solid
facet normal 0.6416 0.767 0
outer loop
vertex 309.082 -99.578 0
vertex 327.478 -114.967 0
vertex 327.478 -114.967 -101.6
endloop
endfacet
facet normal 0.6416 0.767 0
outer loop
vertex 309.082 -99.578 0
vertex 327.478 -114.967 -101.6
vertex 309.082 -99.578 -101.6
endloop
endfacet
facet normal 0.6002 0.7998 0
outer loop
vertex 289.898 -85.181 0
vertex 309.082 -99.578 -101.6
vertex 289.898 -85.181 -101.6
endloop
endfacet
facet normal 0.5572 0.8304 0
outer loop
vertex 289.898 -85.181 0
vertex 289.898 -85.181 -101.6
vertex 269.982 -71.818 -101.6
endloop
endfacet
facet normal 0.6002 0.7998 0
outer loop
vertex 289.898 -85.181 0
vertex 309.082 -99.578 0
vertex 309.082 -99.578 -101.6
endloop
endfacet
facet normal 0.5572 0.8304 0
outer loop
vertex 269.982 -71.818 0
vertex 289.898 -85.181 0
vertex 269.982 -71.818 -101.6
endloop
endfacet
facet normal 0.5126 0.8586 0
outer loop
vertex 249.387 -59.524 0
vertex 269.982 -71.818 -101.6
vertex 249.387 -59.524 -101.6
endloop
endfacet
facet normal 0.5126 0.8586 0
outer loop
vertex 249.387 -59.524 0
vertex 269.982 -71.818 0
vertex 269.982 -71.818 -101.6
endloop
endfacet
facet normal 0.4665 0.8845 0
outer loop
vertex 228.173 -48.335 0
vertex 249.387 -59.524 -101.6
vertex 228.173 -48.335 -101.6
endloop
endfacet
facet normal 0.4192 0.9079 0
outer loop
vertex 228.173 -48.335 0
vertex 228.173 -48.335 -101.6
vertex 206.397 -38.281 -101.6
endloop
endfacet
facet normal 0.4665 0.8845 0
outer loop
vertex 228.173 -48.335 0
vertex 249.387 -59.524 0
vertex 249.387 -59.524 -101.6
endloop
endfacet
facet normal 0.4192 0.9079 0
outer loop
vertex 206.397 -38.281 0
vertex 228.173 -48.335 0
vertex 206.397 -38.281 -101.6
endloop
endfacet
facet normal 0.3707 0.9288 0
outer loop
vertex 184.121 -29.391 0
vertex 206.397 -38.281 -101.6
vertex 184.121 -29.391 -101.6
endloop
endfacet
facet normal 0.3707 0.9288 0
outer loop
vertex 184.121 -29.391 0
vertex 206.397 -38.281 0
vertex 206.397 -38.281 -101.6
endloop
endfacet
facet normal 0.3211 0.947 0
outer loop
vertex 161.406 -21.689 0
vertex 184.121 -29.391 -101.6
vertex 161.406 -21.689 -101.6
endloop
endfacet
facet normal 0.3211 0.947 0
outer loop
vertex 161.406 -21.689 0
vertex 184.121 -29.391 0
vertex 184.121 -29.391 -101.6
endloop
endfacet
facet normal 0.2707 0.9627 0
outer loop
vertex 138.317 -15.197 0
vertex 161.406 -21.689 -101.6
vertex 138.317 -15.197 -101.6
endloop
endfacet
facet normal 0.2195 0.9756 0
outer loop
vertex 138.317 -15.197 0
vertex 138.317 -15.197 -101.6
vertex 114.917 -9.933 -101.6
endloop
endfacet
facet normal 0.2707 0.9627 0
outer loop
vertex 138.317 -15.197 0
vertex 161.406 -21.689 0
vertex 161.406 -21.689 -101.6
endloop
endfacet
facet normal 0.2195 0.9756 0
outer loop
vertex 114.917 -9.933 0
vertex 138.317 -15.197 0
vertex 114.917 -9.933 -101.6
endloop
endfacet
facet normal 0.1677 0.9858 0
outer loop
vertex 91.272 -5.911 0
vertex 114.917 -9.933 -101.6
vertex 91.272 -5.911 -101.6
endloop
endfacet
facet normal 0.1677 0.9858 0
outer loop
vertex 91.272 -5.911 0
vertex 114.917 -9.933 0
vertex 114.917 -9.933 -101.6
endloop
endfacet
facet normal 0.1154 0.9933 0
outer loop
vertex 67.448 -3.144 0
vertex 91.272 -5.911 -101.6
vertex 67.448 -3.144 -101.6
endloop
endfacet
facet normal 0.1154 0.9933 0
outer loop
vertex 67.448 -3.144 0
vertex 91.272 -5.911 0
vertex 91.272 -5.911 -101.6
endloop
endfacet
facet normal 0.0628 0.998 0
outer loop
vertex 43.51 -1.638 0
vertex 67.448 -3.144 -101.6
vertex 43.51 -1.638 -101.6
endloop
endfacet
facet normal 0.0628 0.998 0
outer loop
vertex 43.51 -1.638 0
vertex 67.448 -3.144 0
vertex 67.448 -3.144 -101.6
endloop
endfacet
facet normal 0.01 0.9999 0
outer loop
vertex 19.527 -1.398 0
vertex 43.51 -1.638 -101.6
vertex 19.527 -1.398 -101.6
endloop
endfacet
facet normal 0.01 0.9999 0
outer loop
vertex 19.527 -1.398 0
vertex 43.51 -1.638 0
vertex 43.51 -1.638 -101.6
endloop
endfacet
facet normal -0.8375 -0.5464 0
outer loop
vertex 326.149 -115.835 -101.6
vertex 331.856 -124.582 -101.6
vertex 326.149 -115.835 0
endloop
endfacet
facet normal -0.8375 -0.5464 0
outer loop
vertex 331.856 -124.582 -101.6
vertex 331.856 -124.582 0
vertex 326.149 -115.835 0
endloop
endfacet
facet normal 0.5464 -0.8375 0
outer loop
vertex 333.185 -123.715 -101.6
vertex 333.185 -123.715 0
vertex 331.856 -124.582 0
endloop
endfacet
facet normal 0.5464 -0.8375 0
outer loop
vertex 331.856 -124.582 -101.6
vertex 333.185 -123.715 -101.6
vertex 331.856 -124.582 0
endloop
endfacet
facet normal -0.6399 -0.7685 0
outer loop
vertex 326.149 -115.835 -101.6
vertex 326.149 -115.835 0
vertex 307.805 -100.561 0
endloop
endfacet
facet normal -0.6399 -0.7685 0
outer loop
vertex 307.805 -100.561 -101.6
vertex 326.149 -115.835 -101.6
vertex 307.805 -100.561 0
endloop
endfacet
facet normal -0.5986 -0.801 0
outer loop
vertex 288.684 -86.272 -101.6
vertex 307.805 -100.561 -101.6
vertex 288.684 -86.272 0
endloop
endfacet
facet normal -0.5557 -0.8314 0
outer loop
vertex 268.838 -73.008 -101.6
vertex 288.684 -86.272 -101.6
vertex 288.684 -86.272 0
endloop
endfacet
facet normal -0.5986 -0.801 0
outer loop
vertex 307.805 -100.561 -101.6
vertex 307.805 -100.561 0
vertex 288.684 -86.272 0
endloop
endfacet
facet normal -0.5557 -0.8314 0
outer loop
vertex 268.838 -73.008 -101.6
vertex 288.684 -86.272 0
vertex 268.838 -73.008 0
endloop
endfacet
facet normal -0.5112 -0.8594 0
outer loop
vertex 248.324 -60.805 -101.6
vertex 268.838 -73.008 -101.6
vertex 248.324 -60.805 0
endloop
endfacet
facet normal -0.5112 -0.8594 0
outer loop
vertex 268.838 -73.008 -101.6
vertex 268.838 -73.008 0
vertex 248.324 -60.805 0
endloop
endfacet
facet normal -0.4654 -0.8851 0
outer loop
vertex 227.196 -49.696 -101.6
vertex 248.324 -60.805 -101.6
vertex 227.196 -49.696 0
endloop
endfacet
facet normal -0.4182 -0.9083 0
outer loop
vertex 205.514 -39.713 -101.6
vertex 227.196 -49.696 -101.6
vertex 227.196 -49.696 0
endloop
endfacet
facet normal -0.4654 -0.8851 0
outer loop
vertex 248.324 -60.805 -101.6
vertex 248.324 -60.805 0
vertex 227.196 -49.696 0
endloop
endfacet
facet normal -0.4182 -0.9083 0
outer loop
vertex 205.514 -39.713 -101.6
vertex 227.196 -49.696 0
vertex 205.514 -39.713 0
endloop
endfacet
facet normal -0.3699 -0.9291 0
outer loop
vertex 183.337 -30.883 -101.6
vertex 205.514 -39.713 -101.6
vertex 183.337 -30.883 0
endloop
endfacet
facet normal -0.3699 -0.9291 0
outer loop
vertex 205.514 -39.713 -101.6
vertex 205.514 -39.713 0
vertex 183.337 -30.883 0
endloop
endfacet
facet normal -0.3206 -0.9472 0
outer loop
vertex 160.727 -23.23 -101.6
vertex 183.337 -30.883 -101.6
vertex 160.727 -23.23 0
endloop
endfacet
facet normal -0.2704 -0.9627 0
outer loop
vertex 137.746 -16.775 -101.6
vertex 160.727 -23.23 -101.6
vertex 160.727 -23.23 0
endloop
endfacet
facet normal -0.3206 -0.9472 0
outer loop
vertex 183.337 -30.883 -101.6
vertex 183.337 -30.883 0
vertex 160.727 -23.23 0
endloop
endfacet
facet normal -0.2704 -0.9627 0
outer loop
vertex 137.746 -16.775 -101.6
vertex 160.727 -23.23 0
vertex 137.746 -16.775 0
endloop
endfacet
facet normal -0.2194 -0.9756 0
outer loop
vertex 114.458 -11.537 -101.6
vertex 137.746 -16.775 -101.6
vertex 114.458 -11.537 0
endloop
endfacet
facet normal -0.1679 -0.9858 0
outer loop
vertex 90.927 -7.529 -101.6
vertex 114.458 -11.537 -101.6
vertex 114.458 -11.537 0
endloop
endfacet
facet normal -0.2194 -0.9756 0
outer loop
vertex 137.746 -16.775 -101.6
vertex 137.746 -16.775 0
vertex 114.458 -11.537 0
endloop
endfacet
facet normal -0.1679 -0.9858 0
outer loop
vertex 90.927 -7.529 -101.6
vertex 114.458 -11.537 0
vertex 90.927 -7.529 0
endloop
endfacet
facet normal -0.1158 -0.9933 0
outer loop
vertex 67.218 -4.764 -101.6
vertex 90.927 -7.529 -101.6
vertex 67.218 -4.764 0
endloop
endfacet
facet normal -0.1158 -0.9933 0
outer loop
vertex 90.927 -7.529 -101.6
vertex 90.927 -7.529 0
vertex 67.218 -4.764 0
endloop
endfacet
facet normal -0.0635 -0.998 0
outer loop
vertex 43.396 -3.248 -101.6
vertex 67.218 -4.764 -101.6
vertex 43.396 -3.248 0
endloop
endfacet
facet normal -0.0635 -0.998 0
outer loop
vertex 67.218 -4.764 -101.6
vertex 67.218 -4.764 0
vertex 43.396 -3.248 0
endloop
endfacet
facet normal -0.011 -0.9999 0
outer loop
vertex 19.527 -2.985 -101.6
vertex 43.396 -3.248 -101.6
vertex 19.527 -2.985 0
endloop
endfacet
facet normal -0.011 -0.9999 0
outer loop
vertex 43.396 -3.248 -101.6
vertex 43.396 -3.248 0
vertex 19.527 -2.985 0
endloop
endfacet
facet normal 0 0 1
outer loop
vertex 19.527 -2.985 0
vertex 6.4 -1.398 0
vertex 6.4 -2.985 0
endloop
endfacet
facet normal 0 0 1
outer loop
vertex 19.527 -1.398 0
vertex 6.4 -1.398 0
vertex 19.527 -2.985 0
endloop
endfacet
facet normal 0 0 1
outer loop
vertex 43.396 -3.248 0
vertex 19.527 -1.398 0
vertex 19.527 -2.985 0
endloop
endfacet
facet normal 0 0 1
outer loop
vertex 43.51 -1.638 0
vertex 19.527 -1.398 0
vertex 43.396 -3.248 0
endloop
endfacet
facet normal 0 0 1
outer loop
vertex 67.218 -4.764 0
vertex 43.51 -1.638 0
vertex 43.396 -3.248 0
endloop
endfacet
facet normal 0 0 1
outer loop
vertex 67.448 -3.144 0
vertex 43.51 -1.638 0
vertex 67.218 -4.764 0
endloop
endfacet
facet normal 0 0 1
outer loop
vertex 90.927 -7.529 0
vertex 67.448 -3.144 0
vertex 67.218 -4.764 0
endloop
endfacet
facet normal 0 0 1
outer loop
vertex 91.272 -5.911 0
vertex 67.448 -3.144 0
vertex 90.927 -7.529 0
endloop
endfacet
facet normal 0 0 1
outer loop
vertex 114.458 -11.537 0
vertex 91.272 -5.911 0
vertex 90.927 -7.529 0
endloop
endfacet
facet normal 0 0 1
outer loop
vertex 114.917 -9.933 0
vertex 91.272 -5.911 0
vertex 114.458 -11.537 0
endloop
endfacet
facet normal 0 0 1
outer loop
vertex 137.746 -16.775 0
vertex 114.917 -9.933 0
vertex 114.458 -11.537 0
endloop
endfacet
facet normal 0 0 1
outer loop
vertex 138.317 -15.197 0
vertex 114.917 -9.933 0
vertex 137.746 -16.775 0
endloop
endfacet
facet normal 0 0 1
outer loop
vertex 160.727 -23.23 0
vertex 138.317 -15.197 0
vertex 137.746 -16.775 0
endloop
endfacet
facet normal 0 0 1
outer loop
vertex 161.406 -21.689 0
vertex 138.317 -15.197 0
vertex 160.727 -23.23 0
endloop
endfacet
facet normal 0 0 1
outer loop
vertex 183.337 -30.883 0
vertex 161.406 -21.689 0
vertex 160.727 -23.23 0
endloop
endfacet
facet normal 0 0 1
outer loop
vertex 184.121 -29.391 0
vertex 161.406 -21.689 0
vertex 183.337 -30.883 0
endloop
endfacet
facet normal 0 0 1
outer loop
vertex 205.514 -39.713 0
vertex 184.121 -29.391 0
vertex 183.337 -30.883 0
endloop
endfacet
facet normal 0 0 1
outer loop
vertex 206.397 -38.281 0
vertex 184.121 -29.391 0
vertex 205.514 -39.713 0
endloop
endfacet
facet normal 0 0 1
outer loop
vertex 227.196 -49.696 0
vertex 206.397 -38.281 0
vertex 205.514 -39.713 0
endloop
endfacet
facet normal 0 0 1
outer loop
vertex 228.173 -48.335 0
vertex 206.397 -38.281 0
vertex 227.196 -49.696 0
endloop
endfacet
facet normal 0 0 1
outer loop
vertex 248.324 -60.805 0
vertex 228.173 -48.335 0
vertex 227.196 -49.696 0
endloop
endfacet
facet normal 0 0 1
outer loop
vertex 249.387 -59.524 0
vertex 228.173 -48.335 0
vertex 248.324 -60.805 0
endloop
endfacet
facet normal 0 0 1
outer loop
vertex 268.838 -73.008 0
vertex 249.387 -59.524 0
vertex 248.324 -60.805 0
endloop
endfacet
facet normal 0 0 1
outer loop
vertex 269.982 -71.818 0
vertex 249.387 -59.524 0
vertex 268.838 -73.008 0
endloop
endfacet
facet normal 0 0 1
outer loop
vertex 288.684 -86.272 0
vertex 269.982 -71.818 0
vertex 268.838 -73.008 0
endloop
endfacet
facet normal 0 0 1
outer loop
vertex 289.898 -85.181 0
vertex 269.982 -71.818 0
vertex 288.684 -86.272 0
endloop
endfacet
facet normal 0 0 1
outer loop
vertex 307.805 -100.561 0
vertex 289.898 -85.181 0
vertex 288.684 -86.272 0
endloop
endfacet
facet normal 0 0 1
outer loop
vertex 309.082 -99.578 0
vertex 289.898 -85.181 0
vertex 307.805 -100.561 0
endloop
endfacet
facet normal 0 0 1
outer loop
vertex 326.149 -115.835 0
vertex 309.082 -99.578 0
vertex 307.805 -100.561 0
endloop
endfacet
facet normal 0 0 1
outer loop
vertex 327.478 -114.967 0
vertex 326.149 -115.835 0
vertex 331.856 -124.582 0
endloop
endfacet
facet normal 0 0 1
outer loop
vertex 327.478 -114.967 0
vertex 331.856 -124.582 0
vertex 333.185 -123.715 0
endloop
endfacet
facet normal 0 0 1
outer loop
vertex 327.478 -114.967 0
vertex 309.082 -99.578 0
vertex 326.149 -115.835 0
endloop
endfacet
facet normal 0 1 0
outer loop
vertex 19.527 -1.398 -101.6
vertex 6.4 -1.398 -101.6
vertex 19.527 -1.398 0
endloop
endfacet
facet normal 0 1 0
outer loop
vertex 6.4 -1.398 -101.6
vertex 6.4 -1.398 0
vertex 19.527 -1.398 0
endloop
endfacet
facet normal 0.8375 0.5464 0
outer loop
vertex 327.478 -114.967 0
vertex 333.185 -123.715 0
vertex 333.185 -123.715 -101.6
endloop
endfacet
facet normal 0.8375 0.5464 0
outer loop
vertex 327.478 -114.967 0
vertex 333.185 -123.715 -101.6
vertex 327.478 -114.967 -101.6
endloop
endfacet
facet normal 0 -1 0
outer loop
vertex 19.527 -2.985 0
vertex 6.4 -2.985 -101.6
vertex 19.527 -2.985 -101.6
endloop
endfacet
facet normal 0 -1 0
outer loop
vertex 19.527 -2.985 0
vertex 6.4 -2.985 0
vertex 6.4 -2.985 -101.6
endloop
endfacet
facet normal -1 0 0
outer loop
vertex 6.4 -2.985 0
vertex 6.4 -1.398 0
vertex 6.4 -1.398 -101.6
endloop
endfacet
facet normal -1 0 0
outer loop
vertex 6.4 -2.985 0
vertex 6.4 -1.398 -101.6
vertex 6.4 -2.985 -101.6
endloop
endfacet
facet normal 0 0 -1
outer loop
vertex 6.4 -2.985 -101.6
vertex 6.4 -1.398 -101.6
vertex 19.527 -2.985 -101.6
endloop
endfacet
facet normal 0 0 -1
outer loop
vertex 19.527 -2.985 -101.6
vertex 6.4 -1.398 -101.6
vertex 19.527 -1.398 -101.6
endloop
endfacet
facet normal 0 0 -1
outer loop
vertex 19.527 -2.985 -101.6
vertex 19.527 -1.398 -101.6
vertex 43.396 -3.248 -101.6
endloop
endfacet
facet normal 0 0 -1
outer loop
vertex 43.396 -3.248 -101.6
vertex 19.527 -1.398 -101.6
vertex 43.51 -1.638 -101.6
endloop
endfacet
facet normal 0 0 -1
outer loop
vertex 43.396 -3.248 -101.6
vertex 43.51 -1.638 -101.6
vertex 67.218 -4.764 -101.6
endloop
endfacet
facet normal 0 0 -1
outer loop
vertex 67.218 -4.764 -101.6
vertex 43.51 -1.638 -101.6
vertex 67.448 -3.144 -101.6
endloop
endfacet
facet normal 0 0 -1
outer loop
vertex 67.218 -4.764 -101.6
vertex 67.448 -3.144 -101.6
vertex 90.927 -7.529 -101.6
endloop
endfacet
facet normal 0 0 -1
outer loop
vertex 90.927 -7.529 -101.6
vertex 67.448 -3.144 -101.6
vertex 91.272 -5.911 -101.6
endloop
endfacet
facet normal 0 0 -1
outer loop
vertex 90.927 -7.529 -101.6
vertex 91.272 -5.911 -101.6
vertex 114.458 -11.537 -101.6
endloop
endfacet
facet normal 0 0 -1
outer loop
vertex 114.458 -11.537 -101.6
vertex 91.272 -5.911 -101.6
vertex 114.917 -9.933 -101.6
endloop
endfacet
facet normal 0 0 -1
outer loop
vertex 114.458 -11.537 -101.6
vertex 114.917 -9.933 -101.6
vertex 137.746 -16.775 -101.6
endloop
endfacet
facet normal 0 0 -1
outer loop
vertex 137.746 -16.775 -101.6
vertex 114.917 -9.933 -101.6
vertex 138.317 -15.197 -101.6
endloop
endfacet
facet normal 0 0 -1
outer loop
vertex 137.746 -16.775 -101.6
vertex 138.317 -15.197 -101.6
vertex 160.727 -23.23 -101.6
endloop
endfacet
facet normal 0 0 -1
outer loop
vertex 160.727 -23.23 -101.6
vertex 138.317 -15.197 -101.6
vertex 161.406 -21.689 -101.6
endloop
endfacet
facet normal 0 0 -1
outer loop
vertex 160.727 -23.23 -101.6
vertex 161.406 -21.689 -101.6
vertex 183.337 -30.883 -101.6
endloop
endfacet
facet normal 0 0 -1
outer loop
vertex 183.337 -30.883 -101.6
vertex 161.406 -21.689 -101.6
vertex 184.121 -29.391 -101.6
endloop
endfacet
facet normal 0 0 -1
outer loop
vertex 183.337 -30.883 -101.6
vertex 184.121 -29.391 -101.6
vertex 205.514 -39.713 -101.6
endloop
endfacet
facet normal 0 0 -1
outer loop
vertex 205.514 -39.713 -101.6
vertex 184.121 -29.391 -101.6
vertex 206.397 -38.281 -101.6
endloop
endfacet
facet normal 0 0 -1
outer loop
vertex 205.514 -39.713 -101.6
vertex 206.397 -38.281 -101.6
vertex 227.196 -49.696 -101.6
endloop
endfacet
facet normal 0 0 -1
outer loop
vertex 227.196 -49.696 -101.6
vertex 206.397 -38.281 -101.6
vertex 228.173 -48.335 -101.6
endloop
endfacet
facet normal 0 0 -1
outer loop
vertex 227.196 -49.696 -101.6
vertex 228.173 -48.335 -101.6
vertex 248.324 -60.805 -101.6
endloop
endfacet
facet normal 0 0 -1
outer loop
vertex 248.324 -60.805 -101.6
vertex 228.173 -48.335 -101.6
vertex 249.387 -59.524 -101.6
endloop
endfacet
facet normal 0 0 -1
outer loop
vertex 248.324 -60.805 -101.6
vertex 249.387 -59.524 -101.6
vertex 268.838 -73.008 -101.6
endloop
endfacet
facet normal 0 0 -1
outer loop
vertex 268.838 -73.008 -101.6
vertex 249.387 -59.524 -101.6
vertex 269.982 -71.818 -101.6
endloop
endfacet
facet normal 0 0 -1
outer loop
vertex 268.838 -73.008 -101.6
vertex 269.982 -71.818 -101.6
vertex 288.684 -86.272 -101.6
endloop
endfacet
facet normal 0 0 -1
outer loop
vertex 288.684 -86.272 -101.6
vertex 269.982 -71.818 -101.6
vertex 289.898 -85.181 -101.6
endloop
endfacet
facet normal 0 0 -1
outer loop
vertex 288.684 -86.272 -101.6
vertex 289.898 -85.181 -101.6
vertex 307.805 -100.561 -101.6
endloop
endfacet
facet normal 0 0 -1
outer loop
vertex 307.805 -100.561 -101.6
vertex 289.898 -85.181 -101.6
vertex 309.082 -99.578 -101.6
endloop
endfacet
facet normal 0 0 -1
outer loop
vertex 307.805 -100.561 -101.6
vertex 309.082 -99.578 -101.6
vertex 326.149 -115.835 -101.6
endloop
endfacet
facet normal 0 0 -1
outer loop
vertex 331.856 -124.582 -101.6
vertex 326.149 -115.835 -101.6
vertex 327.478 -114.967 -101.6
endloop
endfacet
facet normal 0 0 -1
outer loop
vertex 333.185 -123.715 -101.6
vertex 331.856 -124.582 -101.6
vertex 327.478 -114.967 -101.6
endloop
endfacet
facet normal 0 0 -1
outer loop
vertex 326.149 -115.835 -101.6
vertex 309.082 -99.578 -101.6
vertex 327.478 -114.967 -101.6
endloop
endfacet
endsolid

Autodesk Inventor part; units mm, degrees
ref_plane "YZ Plane" through (0, 0, 0) normal (1, 0, 0) x (0, 1, 0)
ref_plane "XZ Plane" through (0, 0, 0) normal (0, 1, 0) x (-1, 0, 0)
ref_plane "XY Plane" through (0, 0, 0) normal (0, 0, 1) x (1, 0, 0)
sketch "Sketch1" plane through (0, 0, 0) normal (0, 0, 1) x (1, 0, 0)
  line L0 (6.4002, -1.3978) -> (19.527, -1.3978)
  line L1 (6.4002, -1.3978) -> (6.4002, -2.9853)
  line L2 (6.4002, -2.9853) -> (19.527, -2.9853)
  line L3 (333.1851, -123.7146) -> (327.4784, -114.9672)
  line L4 (333.1851, -123.7146) -> (331.8555, -124.582)
  line L5 (331.8555, -124.582) -> (326.1488, -115.8346)
  arc A0 (327.4784, -114.9672) -> (19.527, -1.3978) centre (26.9726, -455.509) ccw
  arc A1 (326.1488, -115.8346) -> (19.527, -2.9853) centre (26.4701, -457.1045) ccw
  point P0 (0, 0)
  dimension "d1" = 1.5875
  dimension "d2" = 1.5875
  dimension "d3" = 454.1723
extrude "Extrusion1" add sketch "Sketch1" against normal blind 101.6
properties part number "Hood Lexan" material "Polycarbonate, Clear"
